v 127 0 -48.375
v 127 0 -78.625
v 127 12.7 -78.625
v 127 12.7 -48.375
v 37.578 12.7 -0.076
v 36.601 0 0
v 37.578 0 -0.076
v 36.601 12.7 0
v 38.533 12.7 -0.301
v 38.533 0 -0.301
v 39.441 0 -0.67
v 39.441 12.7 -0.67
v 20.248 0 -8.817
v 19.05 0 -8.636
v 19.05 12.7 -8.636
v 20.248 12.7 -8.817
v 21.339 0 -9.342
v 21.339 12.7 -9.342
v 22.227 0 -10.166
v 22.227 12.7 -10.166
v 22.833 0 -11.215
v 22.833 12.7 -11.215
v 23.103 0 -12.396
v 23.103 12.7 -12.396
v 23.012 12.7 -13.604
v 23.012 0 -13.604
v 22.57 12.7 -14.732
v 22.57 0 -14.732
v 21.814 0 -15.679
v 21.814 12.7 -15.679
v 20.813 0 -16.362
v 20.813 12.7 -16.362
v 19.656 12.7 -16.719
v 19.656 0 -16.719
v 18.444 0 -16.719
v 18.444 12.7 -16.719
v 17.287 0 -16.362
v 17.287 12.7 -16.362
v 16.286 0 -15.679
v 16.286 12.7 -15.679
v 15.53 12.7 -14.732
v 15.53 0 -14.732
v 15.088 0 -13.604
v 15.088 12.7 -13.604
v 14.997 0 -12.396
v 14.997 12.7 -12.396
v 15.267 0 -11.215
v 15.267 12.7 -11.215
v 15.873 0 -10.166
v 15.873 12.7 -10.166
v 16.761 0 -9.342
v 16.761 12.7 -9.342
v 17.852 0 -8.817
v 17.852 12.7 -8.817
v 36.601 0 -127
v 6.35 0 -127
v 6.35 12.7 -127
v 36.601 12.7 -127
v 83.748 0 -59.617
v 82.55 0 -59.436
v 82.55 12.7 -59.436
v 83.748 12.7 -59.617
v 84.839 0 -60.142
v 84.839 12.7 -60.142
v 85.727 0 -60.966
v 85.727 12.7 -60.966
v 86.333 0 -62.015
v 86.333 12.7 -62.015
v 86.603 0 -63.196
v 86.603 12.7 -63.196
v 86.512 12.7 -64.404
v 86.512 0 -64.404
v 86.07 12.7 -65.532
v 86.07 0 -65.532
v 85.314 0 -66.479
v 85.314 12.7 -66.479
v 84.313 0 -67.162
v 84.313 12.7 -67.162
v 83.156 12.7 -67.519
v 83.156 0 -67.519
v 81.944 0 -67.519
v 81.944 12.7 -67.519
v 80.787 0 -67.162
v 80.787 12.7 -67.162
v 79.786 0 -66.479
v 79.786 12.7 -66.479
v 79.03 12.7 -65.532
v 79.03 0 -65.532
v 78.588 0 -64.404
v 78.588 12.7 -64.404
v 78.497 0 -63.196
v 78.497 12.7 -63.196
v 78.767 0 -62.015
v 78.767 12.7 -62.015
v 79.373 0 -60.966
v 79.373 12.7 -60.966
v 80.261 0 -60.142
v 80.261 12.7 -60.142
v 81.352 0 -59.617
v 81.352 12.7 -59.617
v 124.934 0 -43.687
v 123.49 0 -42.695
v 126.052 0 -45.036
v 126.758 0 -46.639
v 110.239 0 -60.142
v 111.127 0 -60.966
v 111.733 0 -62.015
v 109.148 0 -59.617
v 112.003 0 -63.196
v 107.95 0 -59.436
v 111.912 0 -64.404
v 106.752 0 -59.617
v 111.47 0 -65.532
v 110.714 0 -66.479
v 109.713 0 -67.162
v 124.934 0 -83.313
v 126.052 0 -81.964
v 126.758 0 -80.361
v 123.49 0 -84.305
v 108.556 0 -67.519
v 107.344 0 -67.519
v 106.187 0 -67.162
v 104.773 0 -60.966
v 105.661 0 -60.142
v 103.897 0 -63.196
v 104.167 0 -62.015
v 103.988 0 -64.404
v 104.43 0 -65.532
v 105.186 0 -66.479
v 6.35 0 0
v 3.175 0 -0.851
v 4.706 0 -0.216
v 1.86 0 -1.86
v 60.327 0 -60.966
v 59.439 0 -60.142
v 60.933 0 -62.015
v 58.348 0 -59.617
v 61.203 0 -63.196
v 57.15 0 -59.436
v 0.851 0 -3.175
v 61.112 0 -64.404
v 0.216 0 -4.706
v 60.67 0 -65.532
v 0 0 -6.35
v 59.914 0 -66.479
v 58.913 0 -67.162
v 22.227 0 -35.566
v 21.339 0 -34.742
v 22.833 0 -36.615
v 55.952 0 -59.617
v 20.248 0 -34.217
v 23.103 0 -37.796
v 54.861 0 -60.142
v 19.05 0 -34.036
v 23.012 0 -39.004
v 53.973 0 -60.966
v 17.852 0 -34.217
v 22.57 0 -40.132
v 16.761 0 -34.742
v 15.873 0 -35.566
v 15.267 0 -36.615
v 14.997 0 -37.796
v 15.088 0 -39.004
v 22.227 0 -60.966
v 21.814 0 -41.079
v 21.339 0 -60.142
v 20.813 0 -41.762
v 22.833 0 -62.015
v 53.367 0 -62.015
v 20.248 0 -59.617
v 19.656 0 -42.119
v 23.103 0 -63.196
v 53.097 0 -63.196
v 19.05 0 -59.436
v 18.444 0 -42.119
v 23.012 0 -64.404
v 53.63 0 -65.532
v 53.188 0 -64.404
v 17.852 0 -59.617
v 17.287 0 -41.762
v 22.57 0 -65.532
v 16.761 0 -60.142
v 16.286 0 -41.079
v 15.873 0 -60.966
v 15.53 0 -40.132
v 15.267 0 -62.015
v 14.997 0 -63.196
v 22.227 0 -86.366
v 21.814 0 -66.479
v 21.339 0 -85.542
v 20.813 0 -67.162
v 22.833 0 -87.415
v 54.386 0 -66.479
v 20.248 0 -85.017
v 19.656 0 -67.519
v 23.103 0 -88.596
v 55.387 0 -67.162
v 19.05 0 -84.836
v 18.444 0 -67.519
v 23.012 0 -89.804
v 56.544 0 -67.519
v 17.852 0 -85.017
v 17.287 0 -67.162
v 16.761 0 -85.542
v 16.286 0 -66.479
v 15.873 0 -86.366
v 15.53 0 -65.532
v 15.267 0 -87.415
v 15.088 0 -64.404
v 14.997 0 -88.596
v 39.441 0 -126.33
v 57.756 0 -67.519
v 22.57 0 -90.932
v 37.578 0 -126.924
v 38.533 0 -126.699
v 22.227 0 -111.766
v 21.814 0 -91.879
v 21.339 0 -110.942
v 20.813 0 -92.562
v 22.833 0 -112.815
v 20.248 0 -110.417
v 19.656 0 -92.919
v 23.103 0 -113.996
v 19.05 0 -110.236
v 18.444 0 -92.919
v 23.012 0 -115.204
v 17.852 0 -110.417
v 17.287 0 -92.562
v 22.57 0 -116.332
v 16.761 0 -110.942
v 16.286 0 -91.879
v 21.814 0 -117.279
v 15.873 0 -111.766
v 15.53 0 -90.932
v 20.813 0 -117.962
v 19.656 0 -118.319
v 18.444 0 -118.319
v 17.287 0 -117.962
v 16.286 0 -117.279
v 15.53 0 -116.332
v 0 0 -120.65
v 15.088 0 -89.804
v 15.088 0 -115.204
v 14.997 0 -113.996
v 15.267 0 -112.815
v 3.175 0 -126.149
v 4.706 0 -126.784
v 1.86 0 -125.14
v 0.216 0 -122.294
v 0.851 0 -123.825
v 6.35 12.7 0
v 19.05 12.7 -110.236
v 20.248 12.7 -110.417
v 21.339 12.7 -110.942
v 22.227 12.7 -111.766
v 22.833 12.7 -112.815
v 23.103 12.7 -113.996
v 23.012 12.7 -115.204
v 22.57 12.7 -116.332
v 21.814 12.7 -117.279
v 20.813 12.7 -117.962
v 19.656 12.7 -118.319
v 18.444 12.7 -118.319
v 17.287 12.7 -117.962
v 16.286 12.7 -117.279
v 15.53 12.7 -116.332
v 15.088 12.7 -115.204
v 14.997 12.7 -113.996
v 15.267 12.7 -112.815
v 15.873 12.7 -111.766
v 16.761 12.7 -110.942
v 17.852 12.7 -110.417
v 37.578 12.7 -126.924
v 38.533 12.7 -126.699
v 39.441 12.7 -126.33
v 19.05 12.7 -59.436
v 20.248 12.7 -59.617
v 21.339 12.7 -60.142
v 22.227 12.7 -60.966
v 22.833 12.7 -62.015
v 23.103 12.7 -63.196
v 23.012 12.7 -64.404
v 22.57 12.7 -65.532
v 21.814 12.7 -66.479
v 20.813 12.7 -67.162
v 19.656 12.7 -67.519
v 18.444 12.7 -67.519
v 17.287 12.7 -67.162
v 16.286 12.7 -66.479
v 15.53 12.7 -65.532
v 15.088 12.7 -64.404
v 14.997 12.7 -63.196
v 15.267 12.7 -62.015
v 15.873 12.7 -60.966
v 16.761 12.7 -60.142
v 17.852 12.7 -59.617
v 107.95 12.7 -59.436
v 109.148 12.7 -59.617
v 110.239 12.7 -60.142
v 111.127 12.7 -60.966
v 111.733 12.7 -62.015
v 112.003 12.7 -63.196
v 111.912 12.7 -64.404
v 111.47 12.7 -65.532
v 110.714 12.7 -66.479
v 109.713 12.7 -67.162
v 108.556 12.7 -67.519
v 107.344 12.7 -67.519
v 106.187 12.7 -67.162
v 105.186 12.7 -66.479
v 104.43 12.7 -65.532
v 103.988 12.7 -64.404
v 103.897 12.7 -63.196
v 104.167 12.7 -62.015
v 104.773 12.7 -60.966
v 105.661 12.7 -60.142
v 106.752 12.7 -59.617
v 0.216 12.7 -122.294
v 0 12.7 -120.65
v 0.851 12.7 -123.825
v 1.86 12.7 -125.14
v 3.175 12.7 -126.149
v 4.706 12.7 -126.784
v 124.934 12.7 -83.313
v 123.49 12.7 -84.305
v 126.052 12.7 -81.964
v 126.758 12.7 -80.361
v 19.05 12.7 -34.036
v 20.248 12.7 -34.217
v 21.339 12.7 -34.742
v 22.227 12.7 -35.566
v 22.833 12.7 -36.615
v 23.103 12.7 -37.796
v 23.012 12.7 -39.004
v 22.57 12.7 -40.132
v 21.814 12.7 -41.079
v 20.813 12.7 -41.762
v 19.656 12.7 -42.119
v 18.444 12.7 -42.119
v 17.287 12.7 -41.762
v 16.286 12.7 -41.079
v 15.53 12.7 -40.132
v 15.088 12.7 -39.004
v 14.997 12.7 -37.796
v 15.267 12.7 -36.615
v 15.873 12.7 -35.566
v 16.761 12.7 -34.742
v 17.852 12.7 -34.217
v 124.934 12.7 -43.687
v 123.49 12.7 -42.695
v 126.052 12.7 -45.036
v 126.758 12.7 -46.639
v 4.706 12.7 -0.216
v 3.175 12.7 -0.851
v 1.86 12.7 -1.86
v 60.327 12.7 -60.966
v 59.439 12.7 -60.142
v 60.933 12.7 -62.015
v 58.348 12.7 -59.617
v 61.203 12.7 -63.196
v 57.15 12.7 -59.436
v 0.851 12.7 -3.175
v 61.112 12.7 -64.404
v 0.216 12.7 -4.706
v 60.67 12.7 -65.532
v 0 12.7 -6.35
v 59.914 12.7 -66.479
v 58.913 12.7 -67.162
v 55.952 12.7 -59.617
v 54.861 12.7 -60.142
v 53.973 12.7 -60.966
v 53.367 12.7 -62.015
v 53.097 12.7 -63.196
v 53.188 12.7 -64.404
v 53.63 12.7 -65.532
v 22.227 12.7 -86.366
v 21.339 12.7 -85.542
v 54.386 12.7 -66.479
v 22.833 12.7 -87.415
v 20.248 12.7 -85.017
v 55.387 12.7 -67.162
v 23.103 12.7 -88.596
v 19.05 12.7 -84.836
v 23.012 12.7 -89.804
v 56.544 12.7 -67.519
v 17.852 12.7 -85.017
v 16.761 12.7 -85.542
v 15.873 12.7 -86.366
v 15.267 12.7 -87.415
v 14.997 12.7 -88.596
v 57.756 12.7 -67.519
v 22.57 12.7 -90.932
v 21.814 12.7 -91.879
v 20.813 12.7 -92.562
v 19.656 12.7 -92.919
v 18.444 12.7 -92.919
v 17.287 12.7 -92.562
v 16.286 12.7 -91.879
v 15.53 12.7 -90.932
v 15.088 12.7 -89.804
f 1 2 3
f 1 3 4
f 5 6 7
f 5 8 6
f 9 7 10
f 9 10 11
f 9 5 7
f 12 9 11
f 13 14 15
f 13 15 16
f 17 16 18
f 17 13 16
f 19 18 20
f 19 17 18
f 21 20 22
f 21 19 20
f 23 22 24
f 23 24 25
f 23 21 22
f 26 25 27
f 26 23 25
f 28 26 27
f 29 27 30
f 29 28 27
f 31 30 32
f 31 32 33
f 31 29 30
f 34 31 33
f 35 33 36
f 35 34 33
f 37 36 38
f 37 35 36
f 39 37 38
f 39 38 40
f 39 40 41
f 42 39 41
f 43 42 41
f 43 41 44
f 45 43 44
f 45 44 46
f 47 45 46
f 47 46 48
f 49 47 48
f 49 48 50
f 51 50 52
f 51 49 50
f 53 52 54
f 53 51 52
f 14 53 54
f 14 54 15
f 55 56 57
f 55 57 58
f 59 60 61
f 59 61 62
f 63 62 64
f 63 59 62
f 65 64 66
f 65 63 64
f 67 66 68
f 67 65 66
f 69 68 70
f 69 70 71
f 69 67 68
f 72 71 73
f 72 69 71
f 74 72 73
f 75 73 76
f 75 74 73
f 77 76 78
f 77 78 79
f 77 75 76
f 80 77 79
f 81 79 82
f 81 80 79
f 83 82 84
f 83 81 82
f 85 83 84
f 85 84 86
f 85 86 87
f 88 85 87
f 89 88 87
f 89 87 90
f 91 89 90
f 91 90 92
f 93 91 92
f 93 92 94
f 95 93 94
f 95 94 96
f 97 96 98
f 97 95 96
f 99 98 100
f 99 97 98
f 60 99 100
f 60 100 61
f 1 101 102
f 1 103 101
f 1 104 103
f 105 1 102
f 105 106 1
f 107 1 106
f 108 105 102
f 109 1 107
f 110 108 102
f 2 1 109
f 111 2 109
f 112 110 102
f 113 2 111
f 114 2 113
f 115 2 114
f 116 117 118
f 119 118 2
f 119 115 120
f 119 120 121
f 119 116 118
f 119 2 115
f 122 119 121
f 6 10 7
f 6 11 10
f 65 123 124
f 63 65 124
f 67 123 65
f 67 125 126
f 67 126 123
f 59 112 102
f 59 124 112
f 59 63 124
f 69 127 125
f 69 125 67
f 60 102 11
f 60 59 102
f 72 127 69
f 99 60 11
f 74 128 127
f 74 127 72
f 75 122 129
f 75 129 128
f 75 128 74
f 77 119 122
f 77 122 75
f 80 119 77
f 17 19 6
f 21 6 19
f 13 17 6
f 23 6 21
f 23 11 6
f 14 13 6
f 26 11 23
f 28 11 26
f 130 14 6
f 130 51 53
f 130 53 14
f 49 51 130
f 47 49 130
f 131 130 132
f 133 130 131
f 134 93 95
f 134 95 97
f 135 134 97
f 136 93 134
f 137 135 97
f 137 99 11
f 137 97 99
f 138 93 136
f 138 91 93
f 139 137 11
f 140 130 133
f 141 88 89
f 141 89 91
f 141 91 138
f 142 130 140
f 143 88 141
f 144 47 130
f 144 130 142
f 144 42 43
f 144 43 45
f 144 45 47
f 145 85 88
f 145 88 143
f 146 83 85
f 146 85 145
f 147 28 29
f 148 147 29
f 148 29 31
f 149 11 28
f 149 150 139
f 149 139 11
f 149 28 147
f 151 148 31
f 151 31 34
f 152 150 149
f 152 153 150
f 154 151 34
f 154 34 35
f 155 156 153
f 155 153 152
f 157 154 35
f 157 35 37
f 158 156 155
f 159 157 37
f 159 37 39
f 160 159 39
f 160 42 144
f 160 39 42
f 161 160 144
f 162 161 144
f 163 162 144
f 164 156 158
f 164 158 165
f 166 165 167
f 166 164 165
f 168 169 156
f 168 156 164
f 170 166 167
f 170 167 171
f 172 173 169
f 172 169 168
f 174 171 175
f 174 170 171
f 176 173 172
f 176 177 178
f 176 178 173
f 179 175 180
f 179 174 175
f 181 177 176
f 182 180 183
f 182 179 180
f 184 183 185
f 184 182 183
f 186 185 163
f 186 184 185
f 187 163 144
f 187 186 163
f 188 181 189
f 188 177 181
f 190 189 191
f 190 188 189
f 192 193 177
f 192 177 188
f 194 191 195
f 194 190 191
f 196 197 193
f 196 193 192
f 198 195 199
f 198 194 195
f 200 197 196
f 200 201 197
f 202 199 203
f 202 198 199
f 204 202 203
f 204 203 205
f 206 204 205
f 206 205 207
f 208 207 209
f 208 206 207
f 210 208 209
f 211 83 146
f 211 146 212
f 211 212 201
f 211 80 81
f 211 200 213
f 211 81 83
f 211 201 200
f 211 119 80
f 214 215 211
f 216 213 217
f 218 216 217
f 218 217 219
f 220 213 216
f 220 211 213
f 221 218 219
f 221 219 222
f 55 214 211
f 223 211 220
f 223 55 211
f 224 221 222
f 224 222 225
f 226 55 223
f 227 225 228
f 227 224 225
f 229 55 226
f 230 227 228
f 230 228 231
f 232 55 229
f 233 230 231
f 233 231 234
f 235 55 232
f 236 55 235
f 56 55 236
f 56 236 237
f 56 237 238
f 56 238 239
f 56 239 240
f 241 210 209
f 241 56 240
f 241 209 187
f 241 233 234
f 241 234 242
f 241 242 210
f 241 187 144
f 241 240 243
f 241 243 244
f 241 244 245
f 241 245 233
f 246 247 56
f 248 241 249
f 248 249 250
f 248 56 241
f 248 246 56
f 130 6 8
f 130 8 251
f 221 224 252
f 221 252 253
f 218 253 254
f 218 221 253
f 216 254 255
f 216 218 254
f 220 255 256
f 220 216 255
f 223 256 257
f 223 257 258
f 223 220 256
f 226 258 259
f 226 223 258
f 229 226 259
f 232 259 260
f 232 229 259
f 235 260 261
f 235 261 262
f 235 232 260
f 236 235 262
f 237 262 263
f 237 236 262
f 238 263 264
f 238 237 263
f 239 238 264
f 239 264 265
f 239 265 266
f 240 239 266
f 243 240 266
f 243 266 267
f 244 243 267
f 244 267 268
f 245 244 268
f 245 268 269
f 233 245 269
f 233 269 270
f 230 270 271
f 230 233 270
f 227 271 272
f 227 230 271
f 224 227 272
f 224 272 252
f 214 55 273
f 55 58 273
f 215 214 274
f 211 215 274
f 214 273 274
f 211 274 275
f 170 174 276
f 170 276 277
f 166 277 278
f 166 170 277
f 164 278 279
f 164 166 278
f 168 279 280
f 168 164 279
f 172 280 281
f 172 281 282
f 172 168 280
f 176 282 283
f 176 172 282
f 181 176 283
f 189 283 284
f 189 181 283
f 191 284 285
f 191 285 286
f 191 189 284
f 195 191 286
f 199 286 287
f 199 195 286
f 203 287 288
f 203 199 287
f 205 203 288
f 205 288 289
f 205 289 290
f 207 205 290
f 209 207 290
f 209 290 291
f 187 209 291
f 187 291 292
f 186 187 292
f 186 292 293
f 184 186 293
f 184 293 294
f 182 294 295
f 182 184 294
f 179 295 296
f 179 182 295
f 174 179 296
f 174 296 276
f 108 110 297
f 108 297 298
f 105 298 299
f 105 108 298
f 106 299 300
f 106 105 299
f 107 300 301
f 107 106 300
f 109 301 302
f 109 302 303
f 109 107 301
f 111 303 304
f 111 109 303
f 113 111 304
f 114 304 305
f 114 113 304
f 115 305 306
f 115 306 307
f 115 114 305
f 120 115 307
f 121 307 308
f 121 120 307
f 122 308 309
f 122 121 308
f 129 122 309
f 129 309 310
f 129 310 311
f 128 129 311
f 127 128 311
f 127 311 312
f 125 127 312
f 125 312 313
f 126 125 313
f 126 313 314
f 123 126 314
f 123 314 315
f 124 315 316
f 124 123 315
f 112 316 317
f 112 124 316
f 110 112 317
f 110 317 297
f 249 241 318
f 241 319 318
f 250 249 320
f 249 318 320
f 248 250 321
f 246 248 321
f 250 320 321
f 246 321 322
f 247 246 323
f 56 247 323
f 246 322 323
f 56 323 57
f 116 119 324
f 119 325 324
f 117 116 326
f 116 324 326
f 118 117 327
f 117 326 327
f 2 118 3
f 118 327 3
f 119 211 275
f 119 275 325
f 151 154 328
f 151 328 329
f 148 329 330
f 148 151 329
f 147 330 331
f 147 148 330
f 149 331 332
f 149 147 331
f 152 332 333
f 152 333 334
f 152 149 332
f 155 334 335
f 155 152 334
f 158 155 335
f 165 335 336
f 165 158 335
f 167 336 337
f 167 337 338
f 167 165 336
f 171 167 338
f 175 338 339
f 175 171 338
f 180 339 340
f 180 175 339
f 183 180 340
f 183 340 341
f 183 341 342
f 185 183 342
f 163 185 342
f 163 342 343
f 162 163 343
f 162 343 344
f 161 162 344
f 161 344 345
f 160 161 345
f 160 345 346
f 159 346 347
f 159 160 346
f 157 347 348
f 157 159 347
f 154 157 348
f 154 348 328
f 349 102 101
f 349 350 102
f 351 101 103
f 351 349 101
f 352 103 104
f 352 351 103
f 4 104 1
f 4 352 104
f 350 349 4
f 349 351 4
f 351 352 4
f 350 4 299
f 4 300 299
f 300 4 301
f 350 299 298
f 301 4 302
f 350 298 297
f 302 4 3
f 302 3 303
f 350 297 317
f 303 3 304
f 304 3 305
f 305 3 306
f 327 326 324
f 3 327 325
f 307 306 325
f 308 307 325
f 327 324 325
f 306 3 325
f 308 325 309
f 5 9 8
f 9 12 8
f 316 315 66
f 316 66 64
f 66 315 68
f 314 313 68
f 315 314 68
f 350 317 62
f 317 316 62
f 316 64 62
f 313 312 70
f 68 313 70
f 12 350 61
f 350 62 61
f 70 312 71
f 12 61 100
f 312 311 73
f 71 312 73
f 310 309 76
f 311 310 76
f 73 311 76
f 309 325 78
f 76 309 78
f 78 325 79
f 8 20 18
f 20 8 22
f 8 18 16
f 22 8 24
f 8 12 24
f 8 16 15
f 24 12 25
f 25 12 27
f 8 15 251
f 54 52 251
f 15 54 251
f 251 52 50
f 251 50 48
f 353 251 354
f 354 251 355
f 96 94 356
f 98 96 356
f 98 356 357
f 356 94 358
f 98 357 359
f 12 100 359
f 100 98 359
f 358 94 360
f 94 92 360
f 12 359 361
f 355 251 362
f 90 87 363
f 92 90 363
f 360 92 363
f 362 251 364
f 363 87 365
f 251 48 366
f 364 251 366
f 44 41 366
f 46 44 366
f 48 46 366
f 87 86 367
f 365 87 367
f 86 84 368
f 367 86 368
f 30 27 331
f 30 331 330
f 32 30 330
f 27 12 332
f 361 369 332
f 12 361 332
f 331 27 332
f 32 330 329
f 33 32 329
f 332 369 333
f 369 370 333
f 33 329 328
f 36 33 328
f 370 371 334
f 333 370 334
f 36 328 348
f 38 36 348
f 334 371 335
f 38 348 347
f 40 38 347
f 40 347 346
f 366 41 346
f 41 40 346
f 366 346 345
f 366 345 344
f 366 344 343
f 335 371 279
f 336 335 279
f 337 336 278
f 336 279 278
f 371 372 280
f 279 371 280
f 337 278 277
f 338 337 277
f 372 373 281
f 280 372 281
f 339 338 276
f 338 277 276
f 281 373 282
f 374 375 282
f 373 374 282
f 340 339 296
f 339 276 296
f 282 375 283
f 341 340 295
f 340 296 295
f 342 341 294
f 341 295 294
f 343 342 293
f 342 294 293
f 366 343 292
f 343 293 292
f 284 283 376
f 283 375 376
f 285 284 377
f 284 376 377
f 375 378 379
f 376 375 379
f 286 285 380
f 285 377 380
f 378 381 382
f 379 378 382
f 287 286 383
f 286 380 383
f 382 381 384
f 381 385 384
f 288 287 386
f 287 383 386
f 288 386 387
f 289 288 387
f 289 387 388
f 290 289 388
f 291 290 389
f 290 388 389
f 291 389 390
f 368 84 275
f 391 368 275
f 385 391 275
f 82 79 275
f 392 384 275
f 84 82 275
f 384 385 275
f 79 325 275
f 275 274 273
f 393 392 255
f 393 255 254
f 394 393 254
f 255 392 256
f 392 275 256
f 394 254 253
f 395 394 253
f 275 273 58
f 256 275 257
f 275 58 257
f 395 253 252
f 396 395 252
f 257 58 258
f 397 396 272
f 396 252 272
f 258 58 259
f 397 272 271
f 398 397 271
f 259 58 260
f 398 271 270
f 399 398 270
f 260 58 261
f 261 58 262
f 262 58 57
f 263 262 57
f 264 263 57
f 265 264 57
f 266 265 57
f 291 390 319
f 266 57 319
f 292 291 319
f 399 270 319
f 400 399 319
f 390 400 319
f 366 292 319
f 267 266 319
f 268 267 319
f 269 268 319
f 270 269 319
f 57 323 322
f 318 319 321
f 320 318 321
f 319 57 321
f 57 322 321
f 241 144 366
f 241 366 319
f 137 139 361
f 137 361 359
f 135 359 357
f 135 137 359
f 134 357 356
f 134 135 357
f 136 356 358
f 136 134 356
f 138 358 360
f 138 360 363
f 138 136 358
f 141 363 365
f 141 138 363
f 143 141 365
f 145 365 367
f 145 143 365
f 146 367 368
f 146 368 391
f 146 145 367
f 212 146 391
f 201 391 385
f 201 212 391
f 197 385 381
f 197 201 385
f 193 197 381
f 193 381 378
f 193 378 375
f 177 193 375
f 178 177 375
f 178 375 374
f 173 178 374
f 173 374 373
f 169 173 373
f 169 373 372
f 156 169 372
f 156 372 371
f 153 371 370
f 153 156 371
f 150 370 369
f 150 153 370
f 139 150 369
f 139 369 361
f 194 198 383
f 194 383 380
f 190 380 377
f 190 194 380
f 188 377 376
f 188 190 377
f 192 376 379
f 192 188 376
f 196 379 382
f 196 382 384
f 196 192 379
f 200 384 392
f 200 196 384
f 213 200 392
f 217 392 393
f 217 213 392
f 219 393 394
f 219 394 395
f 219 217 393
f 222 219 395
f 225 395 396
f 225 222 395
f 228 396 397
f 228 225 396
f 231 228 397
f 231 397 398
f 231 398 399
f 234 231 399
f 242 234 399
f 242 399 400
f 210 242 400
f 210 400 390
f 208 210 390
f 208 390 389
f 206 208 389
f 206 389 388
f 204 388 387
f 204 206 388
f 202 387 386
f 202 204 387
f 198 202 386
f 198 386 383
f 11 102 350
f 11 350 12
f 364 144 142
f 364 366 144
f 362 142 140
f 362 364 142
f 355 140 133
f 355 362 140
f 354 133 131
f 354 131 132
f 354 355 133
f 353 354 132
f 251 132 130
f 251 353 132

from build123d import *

# Parameters (mm, degrees)
SKETCH1_R           = 4.064
BOSS_EXTRUDE1_DEPTH = 12.7
FILLET1_R           = 6.35


with BuildPart() as part:
    # Sketch1 → Boss-Extrude1 (new body)
    with BuildSketch(Plane(origin=(0, 0, 0), x_dir=(1, 0, 0), z_dir=(0, 1, 0))):
        Polygon((0, 0), (0, 127), (38.1, 127), (127, 82.55), (127, 44.45), (38.1, 0), align=None)
        with Locations(Location((19.05, 12.7, 0), (0, 0, 270))):
            Circle(SKETCH1_R, mode=Mode.SUBTRACT)
        with Locations(Location((19.05, 38.1, 0), (0, 0, 270))):
            Circle(SKETCH1_R, mode=Mode.SUBTRACT)
        with Locations(Location((19.05, 63.5, 0), (0, 0, 270))):
            Circle(SKETCH1_R, mode=Mode.SUBTRACT)
        with Locations(Location((19.05, 88.9, 0), (0, 0, 270))):
            Circle(SKETCH1_R, mode=Mode.SUBTRACT)
        with Locations(Location((19.05, 114.3, 0), (0, 0, 270))):
            Circle(SKETCH1_R, mode=Mode.SUBTRACT)
        with Locations(Location((107.95, 63.5, 0), (0, 0, 270))):
            Circle(SKETCH1_R, mode=Mode.SUBTRACT)
        with Locations(Location((82.55, 63.5, 0), (0, 0, 270))):
            Circle(SKETCH1_R, mode=Mode.SUBTRACT)
        with Locations(Location((57.15, 63.5, 0), (0, 0, 270))):
            Circle(SKETCH1_R, mode=Mode.SUBTRACT)
    extrude(amount=BOSS_EXTRUDE1_DEPTH)

    # Fillet1
    fillet1_edges = [part.edges().sort_by_distance(p)[0] for p in [
        (0, 6.35, 0),
        (0, 6.35, -127),
        (38.1, 6.35, -127),
        (127, 6.35, -82.55),
        (127, 6.35, -44.45),
        (38.1, 6.35, 0),
    ]]
    fillet(fillet1_edges, radius=FILLET1_R)


solid = part.part
